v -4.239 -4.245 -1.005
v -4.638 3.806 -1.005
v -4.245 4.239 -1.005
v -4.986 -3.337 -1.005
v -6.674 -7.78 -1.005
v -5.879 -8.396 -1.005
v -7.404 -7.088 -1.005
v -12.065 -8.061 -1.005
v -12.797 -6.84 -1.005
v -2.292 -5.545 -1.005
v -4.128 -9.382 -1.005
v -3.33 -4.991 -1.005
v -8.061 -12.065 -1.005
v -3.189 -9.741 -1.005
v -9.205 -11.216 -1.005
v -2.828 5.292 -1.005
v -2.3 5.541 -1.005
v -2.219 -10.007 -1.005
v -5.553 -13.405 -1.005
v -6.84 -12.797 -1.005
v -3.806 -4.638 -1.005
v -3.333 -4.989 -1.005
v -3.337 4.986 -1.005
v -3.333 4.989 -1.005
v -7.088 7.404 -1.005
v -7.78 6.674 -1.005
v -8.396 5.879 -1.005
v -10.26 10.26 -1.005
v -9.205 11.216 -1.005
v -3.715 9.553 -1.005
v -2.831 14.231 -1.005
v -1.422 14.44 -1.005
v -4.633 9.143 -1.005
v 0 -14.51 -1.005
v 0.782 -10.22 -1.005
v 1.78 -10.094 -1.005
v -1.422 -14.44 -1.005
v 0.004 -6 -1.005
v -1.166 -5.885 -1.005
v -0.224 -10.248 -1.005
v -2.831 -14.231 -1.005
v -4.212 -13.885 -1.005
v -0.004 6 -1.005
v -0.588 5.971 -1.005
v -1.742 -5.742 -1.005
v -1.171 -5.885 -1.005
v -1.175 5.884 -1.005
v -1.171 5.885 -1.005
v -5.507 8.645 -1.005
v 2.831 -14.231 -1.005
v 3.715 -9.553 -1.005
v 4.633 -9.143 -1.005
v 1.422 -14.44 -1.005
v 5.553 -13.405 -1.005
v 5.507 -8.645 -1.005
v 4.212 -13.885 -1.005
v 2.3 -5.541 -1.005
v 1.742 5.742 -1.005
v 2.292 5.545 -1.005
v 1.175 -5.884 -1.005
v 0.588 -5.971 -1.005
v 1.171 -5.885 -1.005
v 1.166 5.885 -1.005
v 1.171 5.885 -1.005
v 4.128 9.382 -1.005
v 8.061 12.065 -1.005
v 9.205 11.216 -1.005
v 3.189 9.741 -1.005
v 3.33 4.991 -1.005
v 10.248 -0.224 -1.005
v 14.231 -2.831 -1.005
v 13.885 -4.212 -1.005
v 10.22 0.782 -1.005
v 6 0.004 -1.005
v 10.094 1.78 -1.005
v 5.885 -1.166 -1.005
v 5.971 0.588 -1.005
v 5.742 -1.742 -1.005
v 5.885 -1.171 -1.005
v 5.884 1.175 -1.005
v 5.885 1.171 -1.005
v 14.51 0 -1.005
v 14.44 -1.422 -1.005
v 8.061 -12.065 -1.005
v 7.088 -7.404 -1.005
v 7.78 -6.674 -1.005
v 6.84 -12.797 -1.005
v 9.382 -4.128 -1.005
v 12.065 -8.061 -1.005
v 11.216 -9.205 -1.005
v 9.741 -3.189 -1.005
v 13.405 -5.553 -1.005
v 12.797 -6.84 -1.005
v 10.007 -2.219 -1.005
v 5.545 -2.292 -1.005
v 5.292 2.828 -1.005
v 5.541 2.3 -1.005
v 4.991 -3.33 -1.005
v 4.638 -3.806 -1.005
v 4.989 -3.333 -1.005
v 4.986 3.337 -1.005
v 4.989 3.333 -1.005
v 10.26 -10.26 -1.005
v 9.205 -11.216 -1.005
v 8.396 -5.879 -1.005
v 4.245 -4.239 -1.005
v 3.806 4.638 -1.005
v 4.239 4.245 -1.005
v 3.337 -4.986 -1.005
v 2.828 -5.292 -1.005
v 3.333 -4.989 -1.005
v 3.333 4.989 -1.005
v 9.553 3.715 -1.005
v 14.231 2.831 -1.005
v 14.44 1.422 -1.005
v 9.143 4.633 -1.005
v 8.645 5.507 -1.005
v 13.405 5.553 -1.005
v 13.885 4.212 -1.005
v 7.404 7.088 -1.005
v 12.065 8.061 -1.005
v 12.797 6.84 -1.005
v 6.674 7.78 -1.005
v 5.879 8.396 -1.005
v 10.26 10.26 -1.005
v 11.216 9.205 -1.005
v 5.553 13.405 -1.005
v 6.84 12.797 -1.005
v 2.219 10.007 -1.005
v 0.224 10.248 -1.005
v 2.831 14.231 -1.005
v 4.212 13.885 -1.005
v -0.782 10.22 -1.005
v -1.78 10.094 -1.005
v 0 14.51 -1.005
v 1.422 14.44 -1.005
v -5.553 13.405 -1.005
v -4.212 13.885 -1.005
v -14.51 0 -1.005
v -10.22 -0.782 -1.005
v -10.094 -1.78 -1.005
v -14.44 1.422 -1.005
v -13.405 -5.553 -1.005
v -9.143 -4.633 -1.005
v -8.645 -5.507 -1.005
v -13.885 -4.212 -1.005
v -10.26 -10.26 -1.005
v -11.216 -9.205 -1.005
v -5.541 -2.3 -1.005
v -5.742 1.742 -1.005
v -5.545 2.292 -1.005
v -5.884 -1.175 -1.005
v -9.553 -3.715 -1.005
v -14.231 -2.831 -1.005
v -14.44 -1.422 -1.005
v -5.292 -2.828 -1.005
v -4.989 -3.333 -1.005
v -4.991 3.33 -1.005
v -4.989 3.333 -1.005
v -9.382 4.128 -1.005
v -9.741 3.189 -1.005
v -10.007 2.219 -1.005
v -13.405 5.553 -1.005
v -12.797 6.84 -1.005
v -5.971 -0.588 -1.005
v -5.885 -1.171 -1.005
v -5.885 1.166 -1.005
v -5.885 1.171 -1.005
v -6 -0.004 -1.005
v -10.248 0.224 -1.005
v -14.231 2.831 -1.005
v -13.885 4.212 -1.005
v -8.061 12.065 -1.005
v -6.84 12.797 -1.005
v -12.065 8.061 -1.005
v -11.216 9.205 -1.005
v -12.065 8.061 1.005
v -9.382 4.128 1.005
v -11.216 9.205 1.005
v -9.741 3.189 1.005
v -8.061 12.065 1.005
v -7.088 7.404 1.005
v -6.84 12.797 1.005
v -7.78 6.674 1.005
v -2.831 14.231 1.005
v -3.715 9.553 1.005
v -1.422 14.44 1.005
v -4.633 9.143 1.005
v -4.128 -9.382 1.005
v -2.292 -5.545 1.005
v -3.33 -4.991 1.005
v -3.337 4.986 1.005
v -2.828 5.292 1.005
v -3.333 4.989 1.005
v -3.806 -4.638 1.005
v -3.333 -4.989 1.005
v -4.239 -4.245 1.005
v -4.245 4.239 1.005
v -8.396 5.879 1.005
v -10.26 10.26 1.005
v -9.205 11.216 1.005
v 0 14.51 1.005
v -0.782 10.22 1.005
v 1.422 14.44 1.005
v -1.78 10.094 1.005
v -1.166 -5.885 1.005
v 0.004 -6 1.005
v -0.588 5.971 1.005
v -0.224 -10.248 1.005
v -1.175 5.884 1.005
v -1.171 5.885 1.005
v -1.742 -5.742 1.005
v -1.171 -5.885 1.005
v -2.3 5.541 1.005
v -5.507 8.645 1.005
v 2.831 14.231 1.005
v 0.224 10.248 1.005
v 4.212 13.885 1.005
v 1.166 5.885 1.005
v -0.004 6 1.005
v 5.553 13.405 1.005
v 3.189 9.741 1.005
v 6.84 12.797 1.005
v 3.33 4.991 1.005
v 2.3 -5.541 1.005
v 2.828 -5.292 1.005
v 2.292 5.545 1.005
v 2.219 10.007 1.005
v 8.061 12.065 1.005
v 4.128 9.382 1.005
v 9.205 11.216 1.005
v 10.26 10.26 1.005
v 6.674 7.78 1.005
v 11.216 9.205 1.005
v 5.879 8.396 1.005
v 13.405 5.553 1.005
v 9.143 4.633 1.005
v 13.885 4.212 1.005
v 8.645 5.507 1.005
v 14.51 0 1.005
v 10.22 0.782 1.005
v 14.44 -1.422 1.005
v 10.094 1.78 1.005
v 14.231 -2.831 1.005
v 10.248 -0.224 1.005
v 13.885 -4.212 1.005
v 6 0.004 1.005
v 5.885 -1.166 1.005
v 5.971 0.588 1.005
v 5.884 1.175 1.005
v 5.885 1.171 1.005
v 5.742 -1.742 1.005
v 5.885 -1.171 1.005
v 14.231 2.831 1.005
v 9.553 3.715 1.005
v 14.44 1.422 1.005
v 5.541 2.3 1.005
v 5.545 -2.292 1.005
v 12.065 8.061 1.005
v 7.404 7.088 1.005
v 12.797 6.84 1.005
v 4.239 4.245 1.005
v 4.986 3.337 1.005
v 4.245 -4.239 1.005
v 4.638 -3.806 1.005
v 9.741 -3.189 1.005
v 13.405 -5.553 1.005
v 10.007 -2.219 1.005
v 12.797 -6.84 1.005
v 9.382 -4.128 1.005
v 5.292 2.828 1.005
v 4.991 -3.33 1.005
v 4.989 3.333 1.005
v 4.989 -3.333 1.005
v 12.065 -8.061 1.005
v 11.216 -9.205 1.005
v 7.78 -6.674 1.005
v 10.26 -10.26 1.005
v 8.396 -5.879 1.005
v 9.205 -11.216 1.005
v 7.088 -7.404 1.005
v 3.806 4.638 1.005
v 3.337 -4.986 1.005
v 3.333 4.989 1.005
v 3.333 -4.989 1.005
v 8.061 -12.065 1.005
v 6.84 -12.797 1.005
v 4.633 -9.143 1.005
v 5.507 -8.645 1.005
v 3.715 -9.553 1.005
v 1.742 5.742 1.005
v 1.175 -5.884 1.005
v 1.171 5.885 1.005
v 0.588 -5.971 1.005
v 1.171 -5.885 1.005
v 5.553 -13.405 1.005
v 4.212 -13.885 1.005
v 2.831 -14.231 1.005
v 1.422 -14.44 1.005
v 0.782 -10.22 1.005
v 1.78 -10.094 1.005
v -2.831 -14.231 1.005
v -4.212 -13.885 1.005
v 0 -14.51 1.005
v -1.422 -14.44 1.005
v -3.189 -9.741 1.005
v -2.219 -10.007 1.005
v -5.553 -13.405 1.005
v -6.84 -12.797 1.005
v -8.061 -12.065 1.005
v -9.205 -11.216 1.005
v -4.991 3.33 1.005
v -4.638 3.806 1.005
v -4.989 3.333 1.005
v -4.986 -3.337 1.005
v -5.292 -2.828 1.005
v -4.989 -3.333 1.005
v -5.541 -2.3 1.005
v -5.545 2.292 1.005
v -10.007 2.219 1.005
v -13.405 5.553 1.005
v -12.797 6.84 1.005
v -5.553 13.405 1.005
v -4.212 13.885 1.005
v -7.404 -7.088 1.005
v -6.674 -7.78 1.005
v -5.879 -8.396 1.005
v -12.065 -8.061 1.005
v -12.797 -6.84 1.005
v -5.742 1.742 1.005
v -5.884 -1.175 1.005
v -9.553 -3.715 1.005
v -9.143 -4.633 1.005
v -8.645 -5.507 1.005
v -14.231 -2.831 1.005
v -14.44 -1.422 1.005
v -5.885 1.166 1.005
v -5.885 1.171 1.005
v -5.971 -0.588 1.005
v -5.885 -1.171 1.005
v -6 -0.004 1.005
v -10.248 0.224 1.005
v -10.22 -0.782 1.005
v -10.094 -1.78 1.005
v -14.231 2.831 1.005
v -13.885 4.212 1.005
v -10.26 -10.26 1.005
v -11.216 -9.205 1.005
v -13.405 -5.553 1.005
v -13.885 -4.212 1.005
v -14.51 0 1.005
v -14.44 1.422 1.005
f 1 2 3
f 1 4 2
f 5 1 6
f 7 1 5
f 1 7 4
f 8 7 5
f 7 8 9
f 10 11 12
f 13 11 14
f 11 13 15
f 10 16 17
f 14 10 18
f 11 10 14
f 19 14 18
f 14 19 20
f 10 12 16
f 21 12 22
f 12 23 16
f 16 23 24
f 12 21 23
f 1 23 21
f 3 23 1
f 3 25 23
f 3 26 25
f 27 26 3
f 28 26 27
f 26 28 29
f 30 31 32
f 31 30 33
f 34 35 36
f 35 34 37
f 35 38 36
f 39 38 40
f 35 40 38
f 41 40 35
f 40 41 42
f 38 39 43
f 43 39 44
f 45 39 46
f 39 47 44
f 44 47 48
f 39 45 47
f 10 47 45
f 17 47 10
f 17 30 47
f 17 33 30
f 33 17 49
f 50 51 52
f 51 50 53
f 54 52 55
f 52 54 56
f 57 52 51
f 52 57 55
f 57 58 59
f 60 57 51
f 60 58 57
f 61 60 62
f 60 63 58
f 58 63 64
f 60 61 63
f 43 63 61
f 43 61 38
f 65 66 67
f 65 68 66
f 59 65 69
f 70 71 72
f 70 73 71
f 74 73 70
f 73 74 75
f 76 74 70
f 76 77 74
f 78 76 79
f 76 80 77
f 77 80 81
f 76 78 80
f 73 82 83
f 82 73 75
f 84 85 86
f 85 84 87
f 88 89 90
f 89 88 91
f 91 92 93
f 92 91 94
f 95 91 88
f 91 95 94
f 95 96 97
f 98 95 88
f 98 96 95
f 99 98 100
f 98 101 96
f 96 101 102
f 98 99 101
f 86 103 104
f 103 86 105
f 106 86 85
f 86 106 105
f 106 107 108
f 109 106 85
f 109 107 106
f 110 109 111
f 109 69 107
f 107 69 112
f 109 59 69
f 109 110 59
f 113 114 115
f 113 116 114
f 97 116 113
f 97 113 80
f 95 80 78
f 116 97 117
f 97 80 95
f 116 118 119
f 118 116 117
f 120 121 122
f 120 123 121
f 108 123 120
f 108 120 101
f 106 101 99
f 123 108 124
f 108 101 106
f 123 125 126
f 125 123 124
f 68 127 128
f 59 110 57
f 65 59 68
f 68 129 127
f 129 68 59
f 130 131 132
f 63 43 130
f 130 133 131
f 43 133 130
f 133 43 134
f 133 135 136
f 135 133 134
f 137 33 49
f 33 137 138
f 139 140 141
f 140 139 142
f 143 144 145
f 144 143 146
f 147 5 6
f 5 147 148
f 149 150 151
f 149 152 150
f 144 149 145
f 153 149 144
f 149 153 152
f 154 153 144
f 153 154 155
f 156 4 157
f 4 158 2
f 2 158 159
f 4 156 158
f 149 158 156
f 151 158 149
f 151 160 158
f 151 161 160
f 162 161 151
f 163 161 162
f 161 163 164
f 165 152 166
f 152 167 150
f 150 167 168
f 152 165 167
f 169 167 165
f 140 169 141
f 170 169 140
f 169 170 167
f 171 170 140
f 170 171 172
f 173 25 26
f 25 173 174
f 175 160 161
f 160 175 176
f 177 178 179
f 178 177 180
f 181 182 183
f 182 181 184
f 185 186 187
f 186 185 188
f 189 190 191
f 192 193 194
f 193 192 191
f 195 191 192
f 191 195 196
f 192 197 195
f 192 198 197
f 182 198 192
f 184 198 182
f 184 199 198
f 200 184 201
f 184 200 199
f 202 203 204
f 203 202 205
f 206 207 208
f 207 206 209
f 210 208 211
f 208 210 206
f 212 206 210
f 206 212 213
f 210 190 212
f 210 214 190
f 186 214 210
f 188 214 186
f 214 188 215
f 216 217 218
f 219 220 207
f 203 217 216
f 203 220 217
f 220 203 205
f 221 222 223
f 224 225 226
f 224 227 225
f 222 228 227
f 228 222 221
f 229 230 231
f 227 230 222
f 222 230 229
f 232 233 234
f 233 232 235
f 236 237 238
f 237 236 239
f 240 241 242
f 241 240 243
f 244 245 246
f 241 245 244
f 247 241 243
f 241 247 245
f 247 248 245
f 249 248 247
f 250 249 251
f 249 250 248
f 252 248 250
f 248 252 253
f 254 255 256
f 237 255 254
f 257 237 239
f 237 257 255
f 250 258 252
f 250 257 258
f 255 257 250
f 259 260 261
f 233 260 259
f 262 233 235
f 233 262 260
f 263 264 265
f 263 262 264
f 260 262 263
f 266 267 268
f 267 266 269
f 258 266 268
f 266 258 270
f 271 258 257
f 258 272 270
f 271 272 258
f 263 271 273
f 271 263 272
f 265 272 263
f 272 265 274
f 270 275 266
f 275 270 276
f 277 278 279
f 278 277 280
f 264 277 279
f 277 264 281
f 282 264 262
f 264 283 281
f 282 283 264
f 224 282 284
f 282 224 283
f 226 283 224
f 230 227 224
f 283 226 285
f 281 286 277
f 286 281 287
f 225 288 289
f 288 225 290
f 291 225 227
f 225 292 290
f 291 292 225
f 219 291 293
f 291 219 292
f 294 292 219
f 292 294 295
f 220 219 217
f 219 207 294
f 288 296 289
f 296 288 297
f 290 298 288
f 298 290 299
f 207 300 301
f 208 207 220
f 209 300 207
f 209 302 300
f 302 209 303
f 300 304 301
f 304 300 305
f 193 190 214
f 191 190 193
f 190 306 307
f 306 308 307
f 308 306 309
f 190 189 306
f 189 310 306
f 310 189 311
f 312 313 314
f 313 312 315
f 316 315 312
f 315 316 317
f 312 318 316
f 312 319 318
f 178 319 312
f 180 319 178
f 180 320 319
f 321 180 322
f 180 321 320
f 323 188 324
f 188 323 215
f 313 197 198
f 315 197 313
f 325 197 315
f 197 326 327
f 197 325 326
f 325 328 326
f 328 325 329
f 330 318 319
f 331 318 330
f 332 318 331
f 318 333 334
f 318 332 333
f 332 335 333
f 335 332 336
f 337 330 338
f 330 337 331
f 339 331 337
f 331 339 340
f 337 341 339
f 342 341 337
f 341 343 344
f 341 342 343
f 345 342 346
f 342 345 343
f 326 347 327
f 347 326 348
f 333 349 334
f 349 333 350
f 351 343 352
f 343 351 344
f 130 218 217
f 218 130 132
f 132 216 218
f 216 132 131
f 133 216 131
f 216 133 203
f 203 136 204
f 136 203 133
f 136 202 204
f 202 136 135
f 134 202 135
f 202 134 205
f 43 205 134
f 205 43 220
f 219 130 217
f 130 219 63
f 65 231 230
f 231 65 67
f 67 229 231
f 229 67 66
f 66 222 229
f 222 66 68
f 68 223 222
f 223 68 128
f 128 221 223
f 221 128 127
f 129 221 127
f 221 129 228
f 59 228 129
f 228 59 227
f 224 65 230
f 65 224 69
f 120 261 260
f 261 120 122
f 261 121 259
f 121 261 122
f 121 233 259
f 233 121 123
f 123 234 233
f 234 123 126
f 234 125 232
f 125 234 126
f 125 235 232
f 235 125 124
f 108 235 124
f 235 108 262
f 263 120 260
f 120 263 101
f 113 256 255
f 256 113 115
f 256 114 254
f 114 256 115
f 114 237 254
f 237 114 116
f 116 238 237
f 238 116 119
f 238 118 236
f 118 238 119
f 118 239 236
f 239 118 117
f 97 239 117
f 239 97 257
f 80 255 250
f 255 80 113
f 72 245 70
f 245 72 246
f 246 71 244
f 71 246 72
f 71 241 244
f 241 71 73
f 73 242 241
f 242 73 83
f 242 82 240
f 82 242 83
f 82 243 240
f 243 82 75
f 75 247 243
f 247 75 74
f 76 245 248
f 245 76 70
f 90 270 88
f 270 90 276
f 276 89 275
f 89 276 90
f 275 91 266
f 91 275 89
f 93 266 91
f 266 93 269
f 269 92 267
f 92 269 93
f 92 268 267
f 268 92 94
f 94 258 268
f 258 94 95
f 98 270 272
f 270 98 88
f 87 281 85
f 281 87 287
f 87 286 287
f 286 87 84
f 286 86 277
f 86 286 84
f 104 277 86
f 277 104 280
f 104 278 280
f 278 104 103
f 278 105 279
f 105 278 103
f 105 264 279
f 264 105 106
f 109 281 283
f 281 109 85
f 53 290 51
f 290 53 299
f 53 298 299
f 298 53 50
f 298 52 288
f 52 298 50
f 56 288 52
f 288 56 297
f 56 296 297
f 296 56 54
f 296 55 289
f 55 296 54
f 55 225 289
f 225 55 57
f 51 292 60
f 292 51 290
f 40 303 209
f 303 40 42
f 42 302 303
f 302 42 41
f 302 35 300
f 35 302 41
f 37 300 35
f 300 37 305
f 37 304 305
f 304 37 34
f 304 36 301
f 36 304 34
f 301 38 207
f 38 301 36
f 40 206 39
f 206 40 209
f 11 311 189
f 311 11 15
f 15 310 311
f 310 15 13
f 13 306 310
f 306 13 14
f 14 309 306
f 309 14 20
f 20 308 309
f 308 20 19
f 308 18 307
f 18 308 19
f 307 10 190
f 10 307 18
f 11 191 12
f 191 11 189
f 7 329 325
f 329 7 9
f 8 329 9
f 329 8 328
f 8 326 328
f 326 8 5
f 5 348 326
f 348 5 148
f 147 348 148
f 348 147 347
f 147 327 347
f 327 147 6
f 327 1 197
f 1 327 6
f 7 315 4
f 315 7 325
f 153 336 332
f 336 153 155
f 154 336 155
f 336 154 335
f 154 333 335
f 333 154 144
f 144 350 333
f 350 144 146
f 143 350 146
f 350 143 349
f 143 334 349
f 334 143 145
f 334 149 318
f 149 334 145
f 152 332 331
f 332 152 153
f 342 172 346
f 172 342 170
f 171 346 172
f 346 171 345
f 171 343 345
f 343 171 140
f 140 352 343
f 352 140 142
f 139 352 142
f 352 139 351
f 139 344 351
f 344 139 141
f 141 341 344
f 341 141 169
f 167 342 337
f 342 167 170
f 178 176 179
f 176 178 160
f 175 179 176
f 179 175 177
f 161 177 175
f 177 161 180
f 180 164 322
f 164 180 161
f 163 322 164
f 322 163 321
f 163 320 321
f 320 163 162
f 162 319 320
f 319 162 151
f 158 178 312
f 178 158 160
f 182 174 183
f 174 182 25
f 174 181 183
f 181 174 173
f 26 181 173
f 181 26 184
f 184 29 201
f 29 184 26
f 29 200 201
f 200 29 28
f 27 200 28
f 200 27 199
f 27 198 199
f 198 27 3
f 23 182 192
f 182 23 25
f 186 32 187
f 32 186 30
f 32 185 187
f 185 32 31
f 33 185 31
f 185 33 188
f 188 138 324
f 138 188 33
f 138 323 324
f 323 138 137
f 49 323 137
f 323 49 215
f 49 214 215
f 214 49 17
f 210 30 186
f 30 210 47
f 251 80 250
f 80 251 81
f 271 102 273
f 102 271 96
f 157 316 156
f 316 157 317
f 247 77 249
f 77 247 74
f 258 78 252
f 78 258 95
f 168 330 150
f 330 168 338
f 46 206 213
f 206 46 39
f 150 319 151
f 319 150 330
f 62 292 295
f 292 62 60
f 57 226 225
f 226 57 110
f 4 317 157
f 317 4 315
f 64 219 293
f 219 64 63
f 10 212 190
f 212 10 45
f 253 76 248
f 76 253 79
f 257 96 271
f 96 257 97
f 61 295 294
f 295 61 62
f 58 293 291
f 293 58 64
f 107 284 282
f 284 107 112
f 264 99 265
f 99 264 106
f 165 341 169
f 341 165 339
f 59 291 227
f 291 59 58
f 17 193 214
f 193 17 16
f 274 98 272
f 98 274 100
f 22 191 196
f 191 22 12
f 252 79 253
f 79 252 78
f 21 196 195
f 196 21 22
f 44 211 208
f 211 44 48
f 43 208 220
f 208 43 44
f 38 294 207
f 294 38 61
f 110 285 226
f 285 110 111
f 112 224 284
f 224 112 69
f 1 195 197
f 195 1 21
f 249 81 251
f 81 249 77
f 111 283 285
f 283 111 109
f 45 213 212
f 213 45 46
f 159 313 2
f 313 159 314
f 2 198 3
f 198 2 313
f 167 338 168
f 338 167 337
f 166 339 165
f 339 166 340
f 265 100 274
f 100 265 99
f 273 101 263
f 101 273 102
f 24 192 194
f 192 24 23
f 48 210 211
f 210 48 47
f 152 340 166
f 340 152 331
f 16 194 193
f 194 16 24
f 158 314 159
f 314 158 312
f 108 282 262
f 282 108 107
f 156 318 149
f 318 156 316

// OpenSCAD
// Start: lazy_union
default_5_default_5();
// End: lazy_union

// Modules.

// 'PartMaterial undef-default - default 5.0'
module default_5_default_5() {
  // 'None : _combine_solids_and_holes'
  union() {
    // 'as_solid : _combine_solids_and_holes'
    union() {
      // ('spoke', 0)
      multmatrix(m=[[1.0, 0.0, 0.0, 0.0], [0.0, 1.0, 0.0, 0.0], [0.0, 0.0, 1.0, -1.005], [0.0, 0.0, 0.0, 1.0]]) {
        // "('spoke', 0) : _combine_solids_and_holes"
        union() {
          // ('spoke', 0)
          linear_extrude(height=2.01, twist=0.0, slices=4, scale=[1.0, 1.0]) {
            polygon(points=[[0.0, 5.99], [-1.779893821086036, 10.094279468375133], [0.0, 14.51], [1.4222287061819243, 14.440130384013576], [-0.7819107386655111, 10.220132856120783], [2.830760572454021, 14.231194418650873], [4.2120306669622485, 13.88520427147435], [0.22360257160425148, 10.247560777569069], [1.1685910288766082, 5.87490382961535]]);
          }
        }
      }
      // ('spoke', 1)
      multmatrix(m=[[0.9238795325112867, 0.38268343236508984, 0.0, 0.0], [-0.3826834323650898, 0.9238795325112867, 0.0, 0.0], [0.0, 0.0, 1.0, -1.005], [0.0, 0.0, 0.0, 1.0]]) {
        // "('spoke', 1) : _combine_solids_and_holes"
        union() {
          // ('spoke', 1)
          linear_extrude(height=2.01, twist=0.0, slices=4, scale=[1.0, 1.0]) {
            polygon(points=[[0.0, 5.99], [-1.779893821086036, 10.094279468375133], [0.0, 14.51], [1.4222287061819243, 14.440130384013576], [-0.7819107386655111, 10.220132856120783], [2.830760572454021, 14.231194418650873], [4.2120306669622485, 13.88520427147435], [0.22360257160425148, 10.247560777569069], [1.1685910288766082, 5.87490382961535]]);
          }
        }
      }
      // ('spoke', 2)
      multmatrix(m=[[0.7071067811865475, 0.7071067811865475, 0.0, 0.0], [-0.7071067811865475, 0.7071067811865475, 0.0, 0.0], [0.0, 0.0, 1.0, -1.005], [0.0, 0.0, 0.0, 1.0]]) {
        // "('spoke', 2) : _combine_solids_and_holes"
        union() {
          // ('spoke', 2)
          linear_extrude(height=2.01, twist=0.0, slices=4, scale=[1.0, 1.0]) {
            polygon(points=[[0.0, 5.99], [-1.779893821086036, 10.094279468375133], [0.0, 14.51], [1.4222287061819243, 14.440130384013576], [-0.7819107386655111, 10.220132856120783], [2.830760572454021, 14.231194418650873], [4.2120306669622485, 13.88520427147435], [0.22360257160425148, 10.247560777569069], [1.1685910288766082, 5.87490382961535]]);
          }
        }
      }
      // ('spoke', 3)
      multmatrix(m=[[0.3826834323650899, 0.9238795325112867, 0.0, 0.0], [-0.9238795325112867, 0.38268343236508984, 0.0, 0.0], [0.0, 0.0, 1.0, -1.005], [0.0, 0.0, 0.0, 1.0]]) {
        // "('spoke', 3) : _combine_solids_and_holes"
        union() {
          // ('spoke', 3)
          linear_extrude(height=2.01, twist=0.0, slices=4, scale=[1.0, 1.0]) {
            polygon(points=[[0.0, 5.99], [-1.779893821086036, 10.094279468375133], [0.0, 14.51], [1.4222287061819243, 14.440130384013576], [-0.7819107386655111, 10.220132856120783], [2.830760572454021, 14.231194418650873], [4.2120306669622485, 13.88520427147435], [0.22360257160425148, 10.247560777569069], [1.1685910288766082, 5.87490382961535]]);
          }
        }
      }
      // ('spoke', 4)
      multmatrix(m=[[0.0, 1.0, 0.0, 0.0], [-1.0, 0.0, 0.0, 0.0], [0.0, 0.0, 1.0, -1.005], [0.0, 0.0, 0.0, 1.0]]) {
        // "('spoke', 4) : _combine_solids_and_holes"
        union() {
          // ('spoke', 4)
          linear_extrude(height=2.01, twist=0.0, slices=4, scale=[1.0, 1.0]) {
            polygon(points=[[0.0, 5.99], [-1.779893821086036, 10.094279468375133], [0.0, 14.51], [1.4222287061819243, 14.440130384013576], [-0.7819107386655111, 10.220132856120783], [2.830760572454021, 14.231194418650873], [4.2120306669622485, 13.88520427147435], [0.22360257160425148, 10.247560777569069], [1.1685910288766082, 5.87490382961535]]);
          }
        }
      }
      // ('spoke', 5)
      multmatrix(m=[[-0.3826834323650898, 0.9238795325112867, 0.0, 0.0], [-0.9238795325112868, -0.3826834323650898, 0.0, 0.0], [0.0, 0.0, 1.0, -1.005], [0.0, 0.0, 0.0, 1.0]]) {
        // "('spoke', 5) : _combine_solids_and_holes"
        union() {
          // ('spoke', 5)
          linear_extrude(height=2.01, twist=0.0, slices=4, scale=[1.0, 1.0]) {
            polygon(points=[[0.0, 5.99], [-1.779893821086036, 10.094279468375133], [0.0, 14.51], [1.4222287061819243, 14.440130384013576], [-0.7819107386655111, 10.220132856120783], [2.830760572454021, 14.231194418650873], [4.2120306669622485, 13.88520427147435], [0.22360257160425148, 10.247560777569069], [1.1685910288766082, 5.87490382961535]]);
          }
        }
      }
      // ('spoke', 6)
      multmatrix(m=[[-0.7071067811865475, 0.7071067811865476, 0.0, 0.0], [-0.7071067811865476, -0.7071067811865475, 0.0, 0.0], [0.0, 0.0, 1.0, -1.005], [0.0, 0.0, 0.0, 1.0]]) {
        // "('spoke', 6) : _combine_solids_and_holes"
        union() {
          // ('spoke', 6)
          linear_extrude(height=2.01, twist=0.0, slices=4, scale=[1.0, 1.0]) {
            polygon(points=[[0.0, 5.99], [-1.779893821086036, 10.094279468375133], [0.0, 14.51], [1.4222287061819243, 14.440130384013576], [-0.7819107386655111, 10.220132856120783], [2.830760572454021, 14.231194418650873], [4.2120306669622485, 13.88520427147435], [0.22360257160425148, 10.247560777569069], [1.1685910288766082, 5.87490382961535]]);
          }
        }
      }
      // ('spoke', 7)
      multmatrix(m=[[-0.9238795325112867, 0.3826834323650899, 0.0, 0.0], [-0.3826834323650899, -0.9238795325112867, 0.0, 0.0], [0.0, 0.0, 1.0, -1.005], [0.0, 0.0, 0.0, 1.0]]) {
        // "('spoke', 7) : _combine_solids_and_holes"
        union() {
          // ('spoke', 7)
          linear_extrude(height=2.01, twist=0.0, slices=4, scale=[1.0, 1.0]) {
            polygon(points=[[0.0, 5.99], [-1.779893821086036, 10.094279468375133], [0.0, 14.51], [1.4222287061819243, 14.440130384013576], [-0.7819107386655111, 10.220132856120783], [2.830760572454021, 14.231194418650873], [4.2120306669622485, 13.88520427147435], [0.22360257160425148, 10.247560777569069], [1.1685910288766082, 5.87490382961535]]);
          }
        }
      }
      // ('spoke', 8)
      multmatrix(m=[[-1.0, 0.0, 0.0, 0.0], [0.0, -1.0, 0.0, 0.0], [0.0, 0.0, 1.0, -1.005], [0.0, 0.0, 0.0, 1.0]]) {
        // "('spoke', 8) : _combine_solids_and_holes"
        union() {
          // ('spoke', 8)
          linear_extrude(height=2.01, twist=0.0, slices=4, scale=[1.0, 1.0]) {
            polygon(points=[[0.0, 5.99], [-1.779893821086036, 10.094279468375133], [0.0, 14.51], [1.4222287061819243, 14.440130384013576], [-0.7819107386655111, 10.220132856120783], [2.830760572454021, 14.231194418650873], [4.2120306669622485, 13.88520427147435], [0.22360257160425148, 10.247560777569069], [1.1685910288766082, 5.87490382961535]]);
          }
        }
      }
      // ('spoke', 9)
      multmatrix(m=[[-0.9238795325112871, -0.38268343236508917, 0.0, 0.0], [0.38268343236508917, -0.9238795325112868, 0.0, 0.0], [0.0, 0.0, 1.0, -1.005], [0.0, 0.0, 0.0, 1.0]]) {
        // "('spoke', 9) : _combine_solids_and_holes"
        union() {
          // ('spoke', 9)
          linear_extrude(height=2.01, twist=0.0, slices=4, scale=[1.0, 1.0]) {
            polygon(points=[[0.0, 5.99], [-1.779893821086036, 10.094279468375133], [0.0, 14.51], [1.4222287061819243, 14.440130384013576], [-0.7819107386655111, 10.220132856120783], [2.830760572454021, 14.231194418650873], [4.2120306669622485, 13.88520427147435], [0.22360257160425148, 10.247560777569069], [1.1685910288766082, 5.87490382961535]]);
          }
        }
      }
      // ('spoke', 10)
      multmatrix(m=[[-0.7071067811865477, -0.7071067811865474, 0.0, 0.0], [0.7071067811865474, -0.7071067811865476, 0.0, 0.0], [0.0, 0.0, 1.0, -1.005], [0.0, 0.0, 0.0, 1.0]]) {
        // "('spoke', 10) : _combine_solids_and_holes"
        union() {
          // ('spoke', 10)
          linear_extrude(height=2.01, twist=0.0, slices=4, scale=[1.0, 1.0]) {
            polygon(points=[[0.0, 5.99], [-1.779893821086036, 10.094279468375133], [0.0, 14.51], [1.4222287061819243, 14.440130384013576], [-0.7819107386655111, 10.220132856120783], [2.830760572454021, 14.231194418650873], [4.2120306669622485, 13.88520427147435], [0.22360257160425148, 10.247560777569069], [1.1685910288766082, 5.87490382961535]]);
          }
        }
      }
      // ('spoke', 11)
      multmatrix(m=[[-0.3826834323650895, -0.9238795325112868, 0.0, 0.0], [0.9238795325112868, -0.3826834323650895, 0.0, 0.0], [0.0, 0.0, 1.0, -1.005], [0.0, 0.0, 0.0, 1.0]]) {
        // "('spoke', 11) : _combine_solids_and_holes"
        union() {
          // ('spoke', 11)
          linear_extrude(height=2.01, twist=0.0, slices=4, scale=[1.0, 1.0]) {
            polygon(points=[[0.0, 5.99], [-1.779893821086036, 10.094279468375133], [0.0, 14.51], [1.4222287061819243, 14.440130384013576], [-0.7819107386655111, 10.220132856120783], [2.830760572454021, 14.231194418650873], [4.2120306669622485, 13.88520427147435], [0.22360257160425148, 10.247560777569069], [1.1685910288766082, 5.87490382961535]]);
          }
        }
      }
      // ('spoke', 12)
      multmatrix(m=[[0.0, -1.0, 0.0, 0.0], [1.0, 0.0, 0.0, 0.0], [0.0, 0.0, 1.0, -1.005], [0.0, 0.0, 0.0, 1.0]]) {
        // "('spoke', 12) : _combine_solids_and_holes"
        union() {
          // ('spoke', 12)
          linear_extrude(height=2.01, twist=0.0, slices=4, scale=[1.0, 1.0]) {
            polygon(points=[[0.0, 5.99], [-1.779893821086036, 10.094279468375133], [0.0, 14.51], [1.4222287061819243, 14.440130384013576], [-0.7819107386655111, 10.220132856120783], [2.830760572454021, 14.231194418650873], [4.2120306669622485, 13.88520427147435], [0.22360257160425148, 10.247560777569069], [1.1685910288766082, 5.87490382961535]]);
          }
        }
      }
      // ('spoke', 13)
      multmatrix(m=[[0.38268343236509, -0.9238795325112866, 0.0, 0.0], [0.9238795325112867, 0.38268343236509, 0.0, 0.0], [0.0, 0.0, 1.0, -1.005], [0.0, 0.0, 0.0, 1.0]]) {
        // "('spoke', 13) : _combine_solids_and_holes"
        union() {
          // ('spoke', 13)
          linear_extrude(height=2.01, twist=0.0, slices=4, scale=[1.0, 1.0]) {
            polygon(points=[[0.0, 5.99], [-1.779893821086036, 10.094279468375133], [0.0, 14.51], [1.4222287061819243, 14.440130384013576], [-0.7819107386655111, 10.220132856120783], [2.830760572454021, 14.231194418650873], [4.2120306669622485, 13.88520427147435], [0.22360257160425148, 10.247560777569069], [1.1685910288766082, 5.87490382961535]]);
          }
        }
      }
      // ('spoke', 14)
      multmatrix(m=[[0.7071067811865474, -0.7071067811865477, 0.0, 0.0], [0.7071067811865477, 0.7071067811865474, 0.0, 0.0], [0.0, 0.0, 1.0, -1.005], [0.0, 0.0, 0.0, 1.0]]) {
        // "('spoke', 14) : _combine_solids_and_holes"
        union() {
          // ('spoke', 14)
          linear_extrude(height=2.01, twist=0.0, slices=4, scale=[1.0, 1.0]) {
            polygon(points=[[0.0, 5.99], [-1.779893821086036, 10.094279468375133], [0.0, 14.51], [1.4222287061819243, 14.440130384013576], [-0.7819107386655111, 10.220132856120783], [2.830760572454021, 14.231194418650873], [4.2120306669622485, 13.88520427147435], [0.22360257160425148, 10.247560777569069], [1.1685910288766082, 5.87490382961535]]);
          }
        }
      }
      // ('spoke', 15)
      multmatrix(m=[[0.9238795325112868, -0.38268343236508956, 0.0, 0.0], [0.38268343236508956, 0.9238795325112868, 0.0, 0.0], [0.0, 0.0, 1.0, -1.005], [0.0, 0.0, 0.0, 1.0]]) {
        // "('spoke', 15) : _combine_solids_and_holes"
        union() {
          // ('spoke', 15)
          linear_extrude(height=2.01, twist=0.0, slices=4, scale=[1.0, 1.0]) {
            polygon(points=[[0.0, 5.99], [-1.779893821086036, 10.094279468375133], [0.0, 14.51], [1.4222287061819243, 14.440130384013576], [-0.7819107386655111, 10.220132856120783], [2.830760572454021, 14.231194418650873], [4.2120306669622485, 13.88520427147435], [0.22360257160425148, 10.247560777569069], [1.1685910288766082, 5.87490382961535]]);
          }
        }
      }
      // 'inner_core'
      multmatrix(m=[[1.0, 0.0, 0.0, 0.0], [0.0, -1.0, 0.0, 0.0], [0.0, 0.0, -1.0, 1.005], [0.0, 0.0, 0.0, 1.0]]) {
        // 'inner_core : _combine_solids_and_holes'
        union() {
          // 'inner_core'
          cylinder(h=2.01, r1=6.0, r2=6.0, center=false, $fn=64);
        }
      }
    }
  }
} // end module default_5_default_5
